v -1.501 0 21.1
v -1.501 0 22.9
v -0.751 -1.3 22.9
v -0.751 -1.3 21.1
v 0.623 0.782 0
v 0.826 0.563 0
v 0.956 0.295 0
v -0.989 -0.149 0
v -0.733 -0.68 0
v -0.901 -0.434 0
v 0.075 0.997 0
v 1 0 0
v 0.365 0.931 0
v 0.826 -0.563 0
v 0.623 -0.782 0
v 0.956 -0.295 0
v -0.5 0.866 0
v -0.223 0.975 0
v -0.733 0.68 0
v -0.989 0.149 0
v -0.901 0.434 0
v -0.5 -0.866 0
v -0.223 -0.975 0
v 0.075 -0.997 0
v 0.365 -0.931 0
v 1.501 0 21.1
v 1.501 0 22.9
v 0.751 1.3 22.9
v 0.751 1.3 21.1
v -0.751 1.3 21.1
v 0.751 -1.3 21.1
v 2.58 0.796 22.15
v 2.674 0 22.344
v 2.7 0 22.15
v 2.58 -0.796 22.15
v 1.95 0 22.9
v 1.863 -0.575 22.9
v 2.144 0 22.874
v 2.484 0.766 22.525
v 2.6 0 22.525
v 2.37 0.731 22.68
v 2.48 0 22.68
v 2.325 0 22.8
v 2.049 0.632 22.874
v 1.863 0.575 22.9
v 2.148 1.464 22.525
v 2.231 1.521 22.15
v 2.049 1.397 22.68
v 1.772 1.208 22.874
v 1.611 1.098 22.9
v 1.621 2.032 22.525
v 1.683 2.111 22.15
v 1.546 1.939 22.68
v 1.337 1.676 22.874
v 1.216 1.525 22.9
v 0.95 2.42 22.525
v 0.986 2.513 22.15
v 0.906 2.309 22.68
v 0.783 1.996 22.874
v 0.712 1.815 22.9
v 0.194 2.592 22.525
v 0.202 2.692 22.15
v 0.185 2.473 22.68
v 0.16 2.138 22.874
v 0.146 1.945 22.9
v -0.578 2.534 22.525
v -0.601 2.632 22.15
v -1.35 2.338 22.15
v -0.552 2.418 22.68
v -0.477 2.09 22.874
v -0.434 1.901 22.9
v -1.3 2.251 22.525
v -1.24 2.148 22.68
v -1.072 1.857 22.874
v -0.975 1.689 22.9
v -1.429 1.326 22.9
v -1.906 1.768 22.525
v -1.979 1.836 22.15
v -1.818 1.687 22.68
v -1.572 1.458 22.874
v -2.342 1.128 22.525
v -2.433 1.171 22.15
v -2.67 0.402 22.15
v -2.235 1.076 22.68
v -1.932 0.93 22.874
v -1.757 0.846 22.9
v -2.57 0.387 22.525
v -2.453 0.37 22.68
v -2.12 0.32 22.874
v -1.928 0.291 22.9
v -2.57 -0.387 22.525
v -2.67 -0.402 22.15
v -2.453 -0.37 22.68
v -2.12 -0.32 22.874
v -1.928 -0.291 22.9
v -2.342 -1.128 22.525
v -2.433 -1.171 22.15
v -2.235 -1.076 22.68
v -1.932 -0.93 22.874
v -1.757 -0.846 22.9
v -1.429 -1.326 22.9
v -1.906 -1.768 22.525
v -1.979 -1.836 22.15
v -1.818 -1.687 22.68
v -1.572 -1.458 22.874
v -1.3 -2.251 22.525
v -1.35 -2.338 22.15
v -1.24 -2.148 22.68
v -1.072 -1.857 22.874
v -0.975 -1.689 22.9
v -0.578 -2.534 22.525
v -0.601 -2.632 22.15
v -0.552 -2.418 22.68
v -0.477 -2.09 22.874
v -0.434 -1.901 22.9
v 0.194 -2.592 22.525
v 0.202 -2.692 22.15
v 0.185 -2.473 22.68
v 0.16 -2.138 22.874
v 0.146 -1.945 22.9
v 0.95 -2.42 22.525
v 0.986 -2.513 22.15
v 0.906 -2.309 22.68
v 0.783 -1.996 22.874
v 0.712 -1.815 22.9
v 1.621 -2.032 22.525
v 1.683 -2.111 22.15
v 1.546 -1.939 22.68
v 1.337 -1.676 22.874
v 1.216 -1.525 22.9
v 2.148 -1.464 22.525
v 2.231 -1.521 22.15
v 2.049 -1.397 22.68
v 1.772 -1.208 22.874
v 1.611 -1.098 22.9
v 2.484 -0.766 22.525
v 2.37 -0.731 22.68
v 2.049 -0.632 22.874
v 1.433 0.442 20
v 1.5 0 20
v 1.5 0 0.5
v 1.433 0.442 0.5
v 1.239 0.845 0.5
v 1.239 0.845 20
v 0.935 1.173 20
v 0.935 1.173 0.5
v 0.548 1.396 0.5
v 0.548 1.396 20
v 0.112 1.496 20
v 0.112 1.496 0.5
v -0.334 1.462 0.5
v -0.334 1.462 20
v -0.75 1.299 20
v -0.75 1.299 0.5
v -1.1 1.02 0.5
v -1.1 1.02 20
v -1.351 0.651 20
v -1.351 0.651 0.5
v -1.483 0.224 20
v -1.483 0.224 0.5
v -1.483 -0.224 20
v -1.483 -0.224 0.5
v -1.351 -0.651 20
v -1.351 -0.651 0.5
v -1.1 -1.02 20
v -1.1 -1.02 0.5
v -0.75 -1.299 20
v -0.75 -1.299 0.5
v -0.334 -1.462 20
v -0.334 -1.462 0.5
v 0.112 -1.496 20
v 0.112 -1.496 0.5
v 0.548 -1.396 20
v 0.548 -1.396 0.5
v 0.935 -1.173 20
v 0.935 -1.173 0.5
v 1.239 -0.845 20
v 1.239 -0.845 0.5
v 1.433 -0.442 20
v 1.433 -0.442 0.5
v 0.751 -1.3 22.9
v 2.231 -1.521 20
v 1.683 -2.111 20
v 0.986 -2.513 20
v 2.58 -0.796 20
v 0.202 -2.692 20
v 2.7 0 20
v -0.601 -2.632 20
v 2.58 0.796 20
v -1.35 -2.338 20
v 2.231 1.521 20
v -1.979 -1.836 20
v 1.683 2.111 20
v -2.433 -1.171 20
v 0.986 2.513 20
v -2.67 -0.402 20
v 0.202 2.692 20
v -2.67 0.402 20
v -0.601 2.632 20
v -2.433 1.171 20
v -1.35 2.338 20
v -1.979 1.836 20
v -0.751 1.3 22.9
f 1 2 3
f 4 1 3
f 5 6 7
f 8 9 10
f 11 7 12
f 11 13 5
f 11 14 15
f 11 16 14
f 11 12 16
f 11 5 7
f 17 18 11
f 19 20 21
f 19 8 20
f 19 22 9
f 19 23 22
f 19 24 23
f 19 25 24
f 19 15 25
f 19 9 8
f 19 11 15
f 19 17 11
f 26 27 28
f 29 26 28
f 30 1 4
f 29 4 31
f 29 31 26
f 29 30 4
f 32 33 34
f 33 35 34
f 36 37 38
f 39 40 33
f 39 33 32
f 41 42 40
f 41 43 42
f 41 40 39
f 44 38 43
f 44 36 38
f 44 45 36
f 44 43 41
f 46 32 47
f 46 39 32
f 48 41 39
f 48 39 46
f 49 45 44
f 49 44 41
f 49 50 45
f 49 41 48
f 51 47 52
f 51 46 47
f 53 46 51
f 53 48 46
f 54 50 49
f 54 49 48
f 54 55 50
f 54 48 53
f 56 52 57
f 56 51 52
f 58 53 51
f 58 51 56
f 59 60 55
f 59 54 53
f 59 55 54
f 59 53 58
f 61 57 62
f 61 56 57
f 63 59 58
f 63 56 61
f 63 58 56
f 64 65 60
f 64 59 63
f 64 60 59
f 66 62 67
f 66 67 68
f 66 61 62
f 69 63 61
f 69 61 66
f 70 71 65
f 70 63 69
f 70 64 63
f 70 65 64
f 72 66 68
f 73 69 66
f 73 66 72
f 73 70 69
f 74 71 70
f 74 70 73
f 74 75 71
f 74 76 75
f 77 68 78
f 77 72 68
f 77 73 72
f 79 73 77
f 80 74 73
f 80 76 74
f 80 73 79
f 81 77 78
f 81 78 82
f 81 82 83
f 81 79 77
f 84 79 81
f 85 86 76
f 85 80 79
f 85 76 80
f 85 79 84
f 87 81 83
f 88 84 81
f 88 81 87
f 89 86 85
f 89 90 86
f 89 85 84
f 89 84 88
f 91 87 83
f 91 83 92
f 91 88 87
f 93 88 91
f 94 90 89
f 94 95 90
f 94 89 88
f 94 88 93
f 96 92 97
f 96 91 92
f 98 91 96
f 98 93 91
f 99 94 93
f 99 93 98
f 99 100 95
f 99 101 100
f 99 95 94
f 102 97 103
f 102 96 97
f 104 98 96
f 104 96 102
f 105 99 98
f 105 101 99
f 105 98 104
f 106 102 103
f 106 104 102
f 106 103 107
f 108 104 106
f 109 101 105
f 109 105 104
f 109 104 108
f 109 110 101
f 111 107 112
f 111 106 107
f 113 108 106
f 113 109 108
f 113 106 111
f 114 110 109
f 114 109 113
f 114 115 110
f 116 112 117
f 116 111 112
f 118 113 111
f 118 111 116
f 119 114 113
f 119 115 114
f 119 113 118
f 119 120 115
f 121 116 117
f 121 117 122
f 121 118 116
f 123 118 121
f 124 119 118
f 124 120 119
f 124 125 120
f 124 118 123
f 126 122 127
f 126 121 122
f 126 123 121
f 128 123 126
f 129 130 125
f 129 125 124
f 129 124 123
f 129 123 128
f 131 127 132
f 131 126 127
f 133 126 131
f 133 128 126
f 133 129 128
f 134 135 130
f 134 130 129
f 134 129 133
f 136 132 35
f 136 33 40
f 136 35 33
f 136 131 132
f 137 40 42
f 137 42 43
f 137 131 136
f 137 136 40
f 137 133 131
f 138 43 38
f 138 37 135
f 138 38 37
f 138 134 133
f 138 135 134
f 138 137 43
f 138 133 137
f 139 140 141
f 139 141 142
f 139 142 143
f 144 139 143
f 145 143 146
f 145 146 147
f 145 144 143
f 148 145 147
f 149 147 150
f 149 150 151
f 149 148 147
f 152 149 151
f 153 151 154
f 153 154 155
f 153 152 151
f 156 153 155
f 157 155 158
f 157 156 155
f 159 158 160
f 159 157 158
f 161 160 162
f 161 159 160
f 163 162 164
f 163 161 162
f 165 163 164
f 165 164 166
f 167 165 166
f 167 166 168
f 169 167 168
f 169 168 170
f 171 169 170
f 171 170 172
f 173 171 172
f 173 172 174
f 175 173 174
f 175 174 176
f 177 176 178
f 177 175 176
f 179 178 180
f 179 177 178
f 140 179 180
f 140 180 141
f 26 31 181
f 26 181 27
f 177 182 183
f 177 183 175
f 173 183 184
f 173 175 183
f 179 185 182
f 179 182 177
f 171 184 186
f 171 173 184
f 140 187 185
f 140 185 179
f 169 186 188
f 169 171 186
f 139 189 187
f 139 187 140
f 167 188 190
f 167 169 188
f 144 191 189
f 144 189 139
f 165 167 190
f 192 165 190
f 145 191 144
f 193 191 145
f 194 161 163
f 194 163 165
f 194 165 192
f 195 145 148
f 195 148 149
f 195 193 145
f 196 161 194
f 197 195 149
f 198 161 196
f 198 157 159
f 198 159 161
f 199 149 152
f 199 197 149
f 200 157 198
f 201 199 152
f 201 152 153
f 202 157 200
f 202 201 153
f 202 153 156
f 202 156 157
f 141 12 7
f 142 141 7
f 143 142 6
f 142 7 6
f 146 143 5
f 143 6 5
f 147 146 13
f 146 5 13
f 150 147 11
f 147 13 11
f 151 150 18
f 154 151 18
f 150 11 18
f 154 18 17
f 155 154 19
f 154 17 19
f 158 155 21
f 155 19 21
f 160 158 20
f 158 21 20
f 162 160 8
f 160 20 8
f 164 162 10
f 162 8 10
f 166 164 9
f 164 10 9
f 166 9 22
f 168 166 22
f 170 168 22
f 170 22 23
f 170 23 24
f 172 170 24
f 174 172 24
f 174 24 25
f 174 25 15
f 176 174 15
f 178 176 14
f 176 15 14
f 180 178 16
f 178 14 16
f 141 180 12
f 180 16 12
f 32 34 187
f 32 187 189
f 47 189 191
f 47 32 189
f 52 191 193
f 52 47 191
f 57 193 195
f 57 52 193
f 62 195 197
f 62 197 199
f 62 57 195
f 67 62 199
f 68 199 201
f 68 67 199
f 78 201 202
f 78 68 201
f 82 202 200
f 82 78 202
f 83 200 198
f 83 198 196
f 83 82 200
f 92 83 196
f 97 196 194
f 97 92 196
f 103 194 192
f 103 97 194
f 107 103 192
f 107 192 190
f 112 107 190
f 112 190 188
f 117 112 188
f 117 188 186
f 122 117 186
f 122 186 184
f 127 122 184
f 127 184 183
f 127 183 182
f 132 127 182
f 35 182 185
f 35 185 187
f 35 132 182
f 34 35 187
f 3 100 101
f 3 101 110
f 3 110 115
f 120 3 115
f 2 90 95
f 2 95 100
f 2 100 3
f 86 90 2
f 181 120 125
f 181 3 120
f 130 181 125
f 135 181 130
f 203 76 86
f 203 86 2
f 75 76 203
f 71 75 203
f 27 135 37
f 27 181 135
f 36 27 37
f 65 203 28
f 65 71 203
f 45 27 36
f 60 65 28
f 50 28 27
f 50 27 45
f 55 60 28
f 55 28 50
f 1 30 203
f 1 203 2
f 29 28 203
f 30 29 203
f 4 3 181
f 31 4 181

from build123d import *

# Parameters (mm, degrees)
F3_DEPTH = 1.8
F4_R     = 0.75
F5_SIZE  = 0.5


with BuildPart() as f1:
    # F0 (on Front) → F1 (revolve)
    with BuildSketch(Plane.XZ):
        Polygon((0, 22.9), (0, 0), (1.5, 0), (1.5, 20), (2.7, 20), (2.7, 22.9), align=None)
    revolve(axis=Axis((0, 0, 11.45), (0, 0, 1)))

    # F2 (on face) → F3 (cut)
    with BuildSketch(Plane.XY.offset(22.9)):
        Polygon((0.750555, 1.3), (-0.750555, 1.3), (-1.501111, 0), (-0.750555, -1.3), (0.750555, -1.3), (1.501111, 0), align=None)
    extrude(amount=-F3_DEPTH, mode=Mode.SUBTRACT)

    # F4
    f4_edges = [f1.edges().sort_by_distance(p)[0] for p in [
        (-2.7, 0, 22.9),
    ]]
    fillet(f4_edges, radius=F4_R)

    # F5
    f5_edges = [f1.edges().sort_by_distance(p)[0] for p in [
        (-1.5, 0, 0),
    ]]
    chamfer(f5_edges, length=F5_SIZE)


solid = f1.part
